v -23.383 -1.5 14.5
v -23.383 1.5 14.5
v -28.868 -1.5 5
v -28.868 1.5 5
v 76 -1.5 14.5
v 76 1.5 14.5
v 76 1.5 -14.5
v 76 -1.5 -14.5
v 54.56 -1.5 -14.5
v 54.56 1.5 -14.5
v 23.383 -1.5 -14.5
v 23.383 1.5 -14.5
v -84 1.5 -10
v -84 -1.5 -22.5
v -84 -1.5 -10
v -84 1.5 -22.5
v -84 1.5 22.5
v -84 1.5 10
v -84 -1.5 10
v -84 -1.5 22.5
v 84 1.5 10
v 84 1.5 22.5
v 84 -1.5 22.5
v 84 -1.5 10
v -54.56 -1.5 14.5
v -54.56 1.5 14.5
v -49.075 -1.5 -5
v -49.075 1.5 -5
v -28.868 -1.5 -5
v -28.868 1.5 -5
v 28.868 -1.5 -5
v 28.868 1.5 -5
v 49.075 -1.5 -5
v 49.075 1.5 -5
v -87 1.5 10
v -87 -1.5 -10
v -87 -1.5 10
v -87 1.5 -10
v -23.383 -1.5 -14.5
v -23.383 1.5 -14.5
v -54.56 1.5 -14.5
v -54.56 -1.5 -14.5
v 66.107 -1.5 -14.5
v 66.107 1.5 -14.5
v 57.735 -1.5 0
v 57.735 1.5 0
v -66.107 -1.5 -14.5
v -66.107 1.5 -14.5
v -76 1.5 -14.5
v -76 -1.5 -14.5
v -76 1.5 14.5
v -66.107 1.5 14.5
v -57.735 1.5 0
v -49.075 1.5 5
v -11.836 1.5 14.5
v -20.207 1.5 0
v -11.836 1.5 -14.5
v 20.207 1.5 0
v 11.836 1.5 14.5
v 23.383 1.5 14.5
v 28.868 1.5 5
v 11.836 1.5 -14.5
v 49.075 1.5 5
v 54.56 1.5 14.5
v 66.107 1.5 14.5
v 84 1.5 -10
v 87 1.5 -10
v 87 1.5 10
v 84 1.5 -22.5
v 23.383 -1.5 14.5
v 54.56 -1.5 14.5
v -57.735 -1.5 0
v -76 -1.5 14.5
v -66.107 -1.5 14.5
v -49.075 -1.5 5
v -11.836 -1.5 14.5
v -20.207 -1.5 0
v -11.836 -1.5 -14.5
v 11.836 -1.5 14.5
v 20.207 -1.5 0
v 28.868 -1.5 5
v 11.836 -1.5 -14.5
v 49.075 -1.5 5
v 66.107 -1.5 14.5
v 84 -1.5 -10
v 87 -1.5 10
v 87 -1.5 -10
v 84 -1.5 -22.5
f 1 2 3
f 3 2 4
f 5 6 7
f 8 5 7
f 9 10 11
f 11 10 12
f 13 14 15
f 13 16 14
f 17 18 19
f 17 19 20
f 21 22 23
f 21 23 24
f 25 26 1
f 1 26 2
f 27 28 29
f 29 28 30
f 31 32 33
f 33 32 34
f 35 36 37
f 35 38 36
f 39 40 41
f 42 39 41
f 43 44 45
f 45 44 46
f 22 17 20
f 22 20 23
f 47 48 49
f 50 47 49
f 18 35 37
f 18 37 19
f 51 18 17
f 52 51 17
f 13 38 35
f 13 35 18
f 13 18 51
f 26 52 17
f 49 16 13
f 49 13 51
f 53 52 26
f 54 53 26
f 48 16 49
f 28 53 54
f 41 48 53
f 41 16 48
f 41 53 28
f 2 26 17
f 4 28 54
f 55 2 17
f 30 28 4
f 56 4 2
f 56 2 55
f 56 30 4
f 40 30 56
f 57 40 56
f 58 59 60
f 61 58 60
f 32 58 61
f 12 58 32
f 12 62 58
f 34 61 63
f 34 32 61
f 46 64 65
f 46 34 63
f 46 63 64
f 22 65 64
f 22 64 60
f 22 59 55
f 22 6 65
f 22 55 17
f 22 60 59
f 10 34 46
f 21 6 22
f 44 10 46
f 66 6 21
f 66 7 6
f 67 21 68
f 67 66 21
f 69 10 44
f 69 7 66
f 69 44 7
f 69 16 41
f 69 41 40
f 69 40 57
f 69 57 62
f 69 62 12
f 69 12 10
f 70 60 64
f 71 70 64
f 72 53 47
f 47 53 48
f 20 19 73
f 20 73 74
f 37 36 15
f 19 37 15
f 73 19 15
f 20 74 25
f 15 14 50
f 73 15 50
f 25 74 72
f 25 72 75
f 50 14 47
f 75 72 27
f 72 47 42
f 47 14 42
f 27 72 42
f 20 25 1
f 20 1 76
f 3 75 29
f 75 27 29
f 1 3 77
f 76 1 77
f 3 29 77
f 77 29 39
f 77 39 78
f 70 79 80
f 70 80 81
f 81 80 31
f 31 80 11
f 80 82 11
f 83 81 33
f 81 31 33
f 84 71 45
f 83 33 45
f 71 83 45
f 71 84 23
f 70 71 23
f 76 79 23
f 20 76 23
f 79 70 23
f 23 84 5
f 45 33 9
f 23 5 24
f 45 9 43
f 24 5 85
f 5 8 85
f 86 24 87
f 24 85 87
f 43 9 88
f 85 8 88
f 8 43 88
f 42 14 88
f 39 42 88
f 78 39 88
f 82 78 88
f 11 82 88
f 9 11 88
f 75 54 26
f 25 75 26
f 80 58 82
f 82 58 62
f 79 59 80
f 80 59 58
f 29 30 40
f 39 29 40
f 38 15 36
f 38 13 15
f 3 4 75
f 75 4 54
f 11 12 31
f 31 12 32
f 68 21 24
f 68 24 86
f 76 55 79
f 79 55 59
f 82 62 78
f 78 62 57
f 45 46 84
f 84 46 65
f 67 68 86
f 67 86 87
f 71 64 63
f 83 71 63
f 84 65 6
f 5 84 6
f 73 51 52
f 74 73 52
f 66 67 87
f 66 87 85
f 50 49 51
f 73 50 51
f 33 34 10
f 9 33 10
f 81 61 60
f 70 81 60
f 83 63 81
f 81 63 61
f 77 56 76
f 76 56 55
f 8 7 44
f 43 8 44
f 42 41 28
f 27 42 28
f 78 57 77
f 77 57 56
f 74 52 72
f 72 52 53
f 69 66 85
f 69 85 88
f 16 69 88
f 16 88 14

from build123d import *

# Parameters (mm, degrees)
BOSS_EXTRUDE1_DEPTH     = 1.5
CUT_EXTRUDE1_DEPTH      = 2.5
CUT_EXTRUDE1_DEPTH_BACK = 2.5


with BuildPart() as part:
    # Sketch1 → Boss-Extrude1 (new body, symmetric)
    with BuildSketch(Plane(origin=(0, 0, 0), x_dir=(1, 0, 0), z_dir=(0, 1, 0))):
        Polygon((-87, 10), (-87, -10), (-84, -10), (-84, -22.5), (84, -22.5), (84, -10), (87, -10), (87, 10), (84, 10), (84, 22.5), (-84, 22.5), (-84, 10), align=None)
    extrude(amount=BOSS_EXTRUDE1_DEPTH, both=True)

    # Sketch3 → Cut-Extrude1 (cut, two sides)
    with BuildSketch(Plane(origin=(0, 0, 0), x_dir=(1, 0, 0), z_dir=(0, 1, 0))) as cut_extrude1_sk:
        Polygon((-76, -14.5), (-66.106605822, -14.5), (-57.735026919, 0), (-66.106605822, 14.5), (-76, 14.5), align=None)
        Polygon((-20.207259422, 0), (-11.835680518, -14.5), (11.835680518, -14.5), (20.207259422, 0), (11.835680518, 14.5), (-11.835680518, 14.5), align=None)
        Polygon((57.735026919, 0), (66.106605822, -14.5), (76, -14.5), (76, 14.5), (66.106605822, 14.5), align=None)
        Polygon((28.867513459, -5), (23.382685902, -14.5), (54.559600438, -14.5), (49.074772881, -5), align=None)
        Polygon((54.559600438, 14.5), (23.382685902, 14.5), (28.867513459, 5), (49.074772881, 5), align=None)
        Polygon((-49.074772881, -5), (-54.559600438, -14.5), (-23.382685902, -14.5), (-28.867513459, -5), align=None)
        Polygon((-23.382685902, 14.5), (-54.559600438, 14.5), (-49.074772881, 5), (-28.867513459, 5), align=None)
    extrude(amount=CUT_EXTRUDE1_DEPTH, mode=Mode.SUBTRACT)
    extrude(cut_extrude1_sk.sketch, amount=-CUT_EXTRUDE1_DEPTH_BACK, mode=Mode.SUBTRACT)


solid = part.part
